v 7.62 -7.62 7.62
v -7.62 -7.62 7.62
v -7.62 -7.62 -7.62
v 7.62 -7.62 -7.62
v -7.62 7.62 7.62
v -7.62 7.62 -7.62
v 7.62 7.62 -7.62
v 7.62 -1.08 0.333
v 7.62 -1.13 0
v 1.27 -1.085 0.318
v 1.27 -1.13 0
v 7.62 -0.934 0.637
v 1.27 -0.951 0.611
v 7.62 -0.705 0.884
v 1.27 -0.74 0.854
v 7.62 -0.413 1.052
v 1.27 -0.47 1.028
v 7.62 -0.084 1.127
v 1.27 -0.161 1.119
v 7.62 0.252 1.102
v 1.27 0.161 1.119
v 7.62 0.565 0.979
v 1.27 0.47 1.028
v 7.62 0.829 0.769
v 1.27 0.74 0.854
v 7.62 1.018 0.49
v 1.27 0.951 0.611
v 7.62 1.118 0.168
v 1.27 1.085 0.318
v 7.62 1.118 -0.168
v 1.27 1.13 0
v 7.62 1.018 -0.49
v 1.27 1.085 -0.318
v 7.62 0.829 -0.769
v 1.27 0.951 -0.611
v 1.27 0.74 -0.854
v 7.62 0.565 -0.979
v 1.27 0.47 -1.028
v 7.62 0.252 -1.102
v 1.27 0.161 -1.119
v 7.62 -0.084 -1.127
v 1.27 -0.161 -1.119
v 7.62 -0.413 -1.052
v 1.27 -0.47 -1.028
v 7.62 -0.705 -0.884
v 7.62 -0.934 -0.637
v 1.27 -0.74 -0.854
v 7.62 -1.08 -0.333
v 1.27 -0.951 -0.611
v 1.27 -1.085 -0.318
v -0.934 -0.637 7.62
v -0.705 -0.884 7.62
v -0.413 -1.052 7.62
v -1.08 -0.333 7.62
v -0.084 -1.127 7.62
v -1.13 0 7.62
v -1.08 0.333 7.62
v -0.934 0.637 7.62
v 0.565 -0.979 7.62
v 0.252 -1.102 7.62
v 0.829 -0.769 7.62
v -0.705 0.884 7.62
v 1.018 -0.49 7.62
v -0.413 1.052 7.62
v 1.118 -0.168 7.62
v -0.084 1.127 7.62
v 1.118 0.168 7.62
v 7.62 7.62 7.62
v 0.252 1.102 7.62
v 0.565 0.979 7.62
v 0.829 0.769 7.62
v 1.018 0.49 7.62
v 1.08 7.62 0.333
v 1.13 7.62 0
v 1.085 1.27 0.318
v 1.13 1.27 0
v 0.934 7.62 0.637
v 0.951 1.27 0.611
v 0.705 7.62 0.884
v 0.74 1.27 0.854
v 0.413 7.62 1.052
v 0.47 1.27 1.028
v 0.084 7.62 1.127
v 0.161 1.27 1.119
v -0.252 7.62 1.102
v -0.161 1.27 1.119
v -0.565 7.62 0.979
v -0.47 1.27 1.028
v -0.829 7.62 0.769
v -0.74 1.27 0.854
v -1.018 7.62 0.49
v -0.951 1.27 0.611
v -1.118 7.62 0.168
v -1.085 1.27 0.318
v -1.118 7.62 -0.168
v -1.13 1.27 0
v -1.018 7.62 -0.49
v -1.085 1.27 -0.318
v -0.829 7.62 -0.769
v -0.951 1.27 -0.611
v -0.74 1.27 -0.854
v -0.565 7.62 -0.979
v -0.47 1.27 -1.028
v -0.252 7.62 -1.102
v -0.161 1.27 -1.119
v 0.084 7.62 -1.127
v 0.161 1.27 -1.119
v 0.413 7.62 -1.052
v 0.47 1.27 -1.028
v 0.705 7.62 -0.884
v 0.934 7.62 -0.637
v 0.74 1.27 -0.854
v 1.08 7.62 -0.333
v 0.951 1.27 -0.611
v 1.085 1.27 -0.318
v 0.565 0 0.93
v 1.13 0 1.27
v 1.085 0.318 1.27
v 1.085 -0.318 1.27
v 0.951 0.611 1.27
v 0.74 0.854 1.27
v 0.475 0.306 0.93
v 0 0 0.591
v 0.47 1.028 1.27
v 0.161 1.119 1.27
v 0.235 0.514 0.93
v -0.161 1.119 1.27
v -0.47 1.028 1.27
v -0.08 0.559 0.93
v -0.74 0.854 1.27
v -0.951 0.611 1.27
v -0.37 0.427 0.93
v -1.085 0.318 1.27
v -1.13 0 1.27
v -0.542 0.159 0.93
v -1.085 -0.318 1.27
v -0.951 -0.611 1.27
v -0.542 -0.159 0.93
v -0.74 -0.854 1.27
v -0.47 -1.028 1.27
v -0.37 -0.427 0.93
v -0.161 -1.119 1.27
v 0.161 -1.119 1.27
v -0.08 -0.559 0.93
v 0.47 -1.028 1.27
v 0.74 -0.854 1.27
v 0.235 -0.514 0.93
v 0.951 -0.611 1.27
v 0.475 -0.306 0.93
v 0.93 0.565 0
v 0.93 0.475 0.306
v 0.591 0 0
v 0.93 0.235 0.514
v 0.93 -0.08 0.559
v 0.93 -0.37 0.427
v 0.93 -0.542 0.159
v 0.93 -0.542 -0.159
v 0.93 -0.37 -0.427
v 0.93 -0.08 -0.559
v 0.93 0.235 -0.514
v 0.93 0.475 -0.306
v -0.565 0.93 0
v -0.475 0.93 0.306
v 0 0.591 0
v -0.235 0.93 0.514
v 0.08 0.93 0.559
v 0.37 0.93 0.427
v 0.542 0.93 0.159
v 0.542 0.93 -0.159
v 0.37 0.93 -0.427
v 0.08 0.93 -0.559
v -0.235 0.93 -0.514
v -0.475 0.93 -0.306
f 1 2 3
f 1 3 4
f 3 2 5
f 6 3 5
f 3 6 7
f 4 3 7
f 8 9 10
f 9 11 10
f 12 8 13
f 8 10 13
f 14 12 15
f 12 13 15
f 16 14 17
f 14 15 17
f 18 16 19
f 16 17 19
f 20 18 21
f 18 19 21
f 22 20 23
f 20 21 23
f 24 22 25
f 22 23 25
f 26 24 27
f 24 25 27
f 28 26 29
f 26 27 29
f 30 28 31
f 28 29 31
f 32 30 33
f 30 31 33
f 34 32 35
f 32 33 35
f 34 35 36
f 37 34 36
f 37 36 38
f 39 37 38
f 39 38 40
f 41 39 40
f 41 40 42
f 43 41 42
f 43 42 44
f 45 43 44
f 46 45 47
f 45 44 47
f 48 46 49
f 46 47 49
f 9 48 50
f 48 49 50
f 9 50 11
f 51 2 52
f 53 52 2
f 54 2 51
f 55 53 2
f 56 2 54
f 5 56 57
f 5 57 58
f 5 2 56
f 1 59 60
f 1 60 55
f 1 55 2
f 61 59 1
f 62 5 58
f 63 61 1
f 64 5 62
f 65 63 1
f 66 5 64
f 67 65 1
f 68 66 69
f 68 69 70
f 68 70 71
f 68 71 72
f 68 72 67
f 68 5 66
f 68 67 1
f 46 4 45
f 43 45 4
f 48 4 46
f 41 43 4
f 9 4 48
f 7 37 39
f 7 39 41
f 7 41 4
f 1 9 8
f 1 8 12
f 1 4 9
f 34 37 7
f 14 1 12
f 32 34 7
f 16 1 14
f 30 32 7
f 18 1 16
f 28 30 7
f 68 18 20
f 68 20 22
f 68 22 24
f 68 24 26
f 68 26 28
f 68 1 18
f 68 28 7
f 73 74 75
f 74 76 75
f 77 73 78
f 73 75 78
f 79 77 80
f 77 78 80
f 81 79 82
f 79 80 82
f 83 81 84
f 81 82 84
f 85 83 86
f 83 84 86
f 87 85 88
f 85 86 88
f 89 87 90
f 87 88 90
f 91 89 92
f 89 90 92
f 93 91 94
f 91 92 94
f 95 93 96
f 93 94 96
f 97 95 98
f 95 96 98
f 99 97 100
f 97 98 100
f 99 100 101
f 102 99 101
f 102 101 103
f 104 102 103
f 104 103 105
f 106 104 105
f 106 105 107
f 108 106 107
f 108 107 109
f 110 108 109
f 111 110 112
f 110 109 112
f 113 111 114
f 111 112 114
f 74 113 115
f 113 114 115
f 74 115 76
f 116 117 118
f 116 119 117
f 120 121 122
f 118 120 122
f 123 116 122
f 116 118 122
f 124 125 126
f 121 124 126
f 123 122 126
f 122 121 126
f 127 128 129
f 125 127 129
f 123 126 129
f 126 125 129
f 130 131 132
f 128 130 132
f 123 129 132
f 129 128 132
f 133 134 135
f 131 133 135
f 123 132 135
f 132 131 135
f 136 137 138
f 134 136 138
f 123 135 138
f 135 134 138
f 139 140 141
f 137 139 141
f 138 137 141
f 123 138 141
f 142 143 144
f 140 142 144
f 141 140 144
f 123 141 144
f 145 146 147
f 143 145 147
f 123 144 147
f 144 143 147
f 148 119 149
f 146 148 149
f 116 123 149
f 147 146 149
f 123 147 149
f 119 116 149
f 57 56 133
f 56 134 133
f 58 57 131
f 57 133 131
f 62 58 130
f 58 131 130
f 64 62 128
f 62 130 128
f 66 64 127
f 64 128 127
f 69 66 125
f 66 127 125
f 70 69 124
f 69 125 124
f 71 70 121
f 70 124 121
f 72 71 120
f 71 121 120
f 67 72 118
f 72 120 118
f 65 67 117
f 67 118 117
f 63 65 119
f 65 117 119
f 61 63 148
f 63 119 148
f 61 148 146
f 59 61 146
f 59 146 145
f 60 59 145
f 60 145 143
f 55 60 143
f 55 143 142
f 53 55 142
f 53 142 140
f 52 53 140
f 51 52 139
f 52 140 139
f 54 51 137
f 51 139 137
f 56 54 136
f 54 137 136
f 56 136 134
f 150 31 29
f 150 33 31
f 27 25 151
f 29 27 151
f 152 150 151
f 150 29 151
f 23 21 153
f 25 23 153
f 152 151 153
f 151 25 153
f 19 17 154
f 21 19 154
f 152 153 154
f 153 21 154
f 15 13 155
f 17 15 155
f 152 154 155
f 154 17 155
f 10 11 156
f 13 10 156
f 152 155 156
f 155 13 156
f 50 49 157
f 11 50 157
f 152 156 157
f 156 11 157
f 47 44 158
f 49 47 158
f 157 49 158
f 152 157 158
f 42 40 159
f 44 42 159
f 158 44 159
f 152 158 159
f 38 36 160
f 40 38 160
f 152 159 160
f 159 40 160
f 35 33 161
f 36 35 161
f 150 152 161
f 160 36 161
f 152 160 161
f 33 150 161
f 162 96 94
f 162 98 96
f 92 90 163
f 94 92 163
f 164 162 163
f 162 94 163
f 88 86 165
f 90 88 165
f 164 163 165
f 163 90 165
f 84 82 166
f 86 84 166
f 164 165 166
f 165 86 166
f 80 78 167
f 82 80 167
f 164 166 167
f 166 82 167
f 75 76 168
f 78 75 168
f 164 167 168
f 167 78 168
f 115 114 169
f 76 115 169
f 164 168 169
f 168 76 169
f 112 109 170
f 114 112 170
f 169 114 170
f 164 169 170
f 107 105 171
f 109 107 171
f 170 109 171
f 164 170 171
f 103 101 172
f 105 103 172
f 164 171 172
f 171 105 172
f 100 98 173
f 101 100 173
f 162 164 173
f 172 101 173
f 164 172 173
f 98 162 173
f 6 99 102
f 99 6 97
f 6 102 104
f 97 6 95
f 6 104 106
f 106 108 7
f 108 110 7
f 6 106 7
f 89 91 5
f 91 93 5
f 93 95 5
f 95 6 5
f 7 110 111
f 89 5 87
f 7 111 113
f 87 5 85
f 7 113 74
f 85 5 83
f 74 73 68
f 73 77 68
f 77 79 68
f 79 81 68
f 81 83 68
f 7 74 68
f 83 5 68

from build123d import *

# Parameters (mm, degrees)
F0_W     = 15.24
F0_H     = 15.24
F1_DEPTH = 7.62
F3_D     = 2.2606
F3_DEPTH = 6.35
F3_TIP   = 0.6791527577
F6_D     = 2.2606
F6_DEPTH = 6.35
F6_TIP   = 0.6791527577
F7_D     = 2.2606
F7_DEPTH = 6.35
F7_TIP   = 0.6791527577


with BuildPart() as f1:
    # F0 (on Top) → F1 (new body, symmetric)
    with BuildSketch(Plane.XY):
        Rectangle(F0_W, F0_H)
    extrude(amount=F1_DEPTH, both=True)

    # F3
    with Locations(Plane.YZ.offset(7.62)):
        with Locations((0, 0)):
            Hole(F3_D / 2, depth=F3_DEPTH)
            with Locations((0, 0, -(F3_DEPTH + F3_TIP / 2))):  # 118° drill point
                Cone(0, F3_D / 2, F3_TIP, mode=Mode.SUBTRACT)

    # F6
    with Locations(Plane.XY.offset(7.62)):
        with Locations((0, 0)):
            Hole(F6_D / 2, depth=F6_DEPTH)
            with Locations((0, 0, -(F6_DEPTH + F6_TIP / 2))):  # 118° drill point
                Cone(0, F6_D / 2, F6_TIP, mode=Mode.SUBTRACT)

    # F7
    with Locations(Plane(origin=(0, 7.62, 0), x_dir=(-1, 0, 0), z_dir=(0, 1, 0))):
        with Locations((0, 0)):
            Hole(F7_D / 2, depth=F7_DEPTH)
            with Locations((0, 0, -(F7_DEPTH + F7_TIP / 2))):  # 118° drill point
                Cone(0, F7_D / 2, F7_TIP, mode=Mode.SUBTRACT)


solid = f1.part
